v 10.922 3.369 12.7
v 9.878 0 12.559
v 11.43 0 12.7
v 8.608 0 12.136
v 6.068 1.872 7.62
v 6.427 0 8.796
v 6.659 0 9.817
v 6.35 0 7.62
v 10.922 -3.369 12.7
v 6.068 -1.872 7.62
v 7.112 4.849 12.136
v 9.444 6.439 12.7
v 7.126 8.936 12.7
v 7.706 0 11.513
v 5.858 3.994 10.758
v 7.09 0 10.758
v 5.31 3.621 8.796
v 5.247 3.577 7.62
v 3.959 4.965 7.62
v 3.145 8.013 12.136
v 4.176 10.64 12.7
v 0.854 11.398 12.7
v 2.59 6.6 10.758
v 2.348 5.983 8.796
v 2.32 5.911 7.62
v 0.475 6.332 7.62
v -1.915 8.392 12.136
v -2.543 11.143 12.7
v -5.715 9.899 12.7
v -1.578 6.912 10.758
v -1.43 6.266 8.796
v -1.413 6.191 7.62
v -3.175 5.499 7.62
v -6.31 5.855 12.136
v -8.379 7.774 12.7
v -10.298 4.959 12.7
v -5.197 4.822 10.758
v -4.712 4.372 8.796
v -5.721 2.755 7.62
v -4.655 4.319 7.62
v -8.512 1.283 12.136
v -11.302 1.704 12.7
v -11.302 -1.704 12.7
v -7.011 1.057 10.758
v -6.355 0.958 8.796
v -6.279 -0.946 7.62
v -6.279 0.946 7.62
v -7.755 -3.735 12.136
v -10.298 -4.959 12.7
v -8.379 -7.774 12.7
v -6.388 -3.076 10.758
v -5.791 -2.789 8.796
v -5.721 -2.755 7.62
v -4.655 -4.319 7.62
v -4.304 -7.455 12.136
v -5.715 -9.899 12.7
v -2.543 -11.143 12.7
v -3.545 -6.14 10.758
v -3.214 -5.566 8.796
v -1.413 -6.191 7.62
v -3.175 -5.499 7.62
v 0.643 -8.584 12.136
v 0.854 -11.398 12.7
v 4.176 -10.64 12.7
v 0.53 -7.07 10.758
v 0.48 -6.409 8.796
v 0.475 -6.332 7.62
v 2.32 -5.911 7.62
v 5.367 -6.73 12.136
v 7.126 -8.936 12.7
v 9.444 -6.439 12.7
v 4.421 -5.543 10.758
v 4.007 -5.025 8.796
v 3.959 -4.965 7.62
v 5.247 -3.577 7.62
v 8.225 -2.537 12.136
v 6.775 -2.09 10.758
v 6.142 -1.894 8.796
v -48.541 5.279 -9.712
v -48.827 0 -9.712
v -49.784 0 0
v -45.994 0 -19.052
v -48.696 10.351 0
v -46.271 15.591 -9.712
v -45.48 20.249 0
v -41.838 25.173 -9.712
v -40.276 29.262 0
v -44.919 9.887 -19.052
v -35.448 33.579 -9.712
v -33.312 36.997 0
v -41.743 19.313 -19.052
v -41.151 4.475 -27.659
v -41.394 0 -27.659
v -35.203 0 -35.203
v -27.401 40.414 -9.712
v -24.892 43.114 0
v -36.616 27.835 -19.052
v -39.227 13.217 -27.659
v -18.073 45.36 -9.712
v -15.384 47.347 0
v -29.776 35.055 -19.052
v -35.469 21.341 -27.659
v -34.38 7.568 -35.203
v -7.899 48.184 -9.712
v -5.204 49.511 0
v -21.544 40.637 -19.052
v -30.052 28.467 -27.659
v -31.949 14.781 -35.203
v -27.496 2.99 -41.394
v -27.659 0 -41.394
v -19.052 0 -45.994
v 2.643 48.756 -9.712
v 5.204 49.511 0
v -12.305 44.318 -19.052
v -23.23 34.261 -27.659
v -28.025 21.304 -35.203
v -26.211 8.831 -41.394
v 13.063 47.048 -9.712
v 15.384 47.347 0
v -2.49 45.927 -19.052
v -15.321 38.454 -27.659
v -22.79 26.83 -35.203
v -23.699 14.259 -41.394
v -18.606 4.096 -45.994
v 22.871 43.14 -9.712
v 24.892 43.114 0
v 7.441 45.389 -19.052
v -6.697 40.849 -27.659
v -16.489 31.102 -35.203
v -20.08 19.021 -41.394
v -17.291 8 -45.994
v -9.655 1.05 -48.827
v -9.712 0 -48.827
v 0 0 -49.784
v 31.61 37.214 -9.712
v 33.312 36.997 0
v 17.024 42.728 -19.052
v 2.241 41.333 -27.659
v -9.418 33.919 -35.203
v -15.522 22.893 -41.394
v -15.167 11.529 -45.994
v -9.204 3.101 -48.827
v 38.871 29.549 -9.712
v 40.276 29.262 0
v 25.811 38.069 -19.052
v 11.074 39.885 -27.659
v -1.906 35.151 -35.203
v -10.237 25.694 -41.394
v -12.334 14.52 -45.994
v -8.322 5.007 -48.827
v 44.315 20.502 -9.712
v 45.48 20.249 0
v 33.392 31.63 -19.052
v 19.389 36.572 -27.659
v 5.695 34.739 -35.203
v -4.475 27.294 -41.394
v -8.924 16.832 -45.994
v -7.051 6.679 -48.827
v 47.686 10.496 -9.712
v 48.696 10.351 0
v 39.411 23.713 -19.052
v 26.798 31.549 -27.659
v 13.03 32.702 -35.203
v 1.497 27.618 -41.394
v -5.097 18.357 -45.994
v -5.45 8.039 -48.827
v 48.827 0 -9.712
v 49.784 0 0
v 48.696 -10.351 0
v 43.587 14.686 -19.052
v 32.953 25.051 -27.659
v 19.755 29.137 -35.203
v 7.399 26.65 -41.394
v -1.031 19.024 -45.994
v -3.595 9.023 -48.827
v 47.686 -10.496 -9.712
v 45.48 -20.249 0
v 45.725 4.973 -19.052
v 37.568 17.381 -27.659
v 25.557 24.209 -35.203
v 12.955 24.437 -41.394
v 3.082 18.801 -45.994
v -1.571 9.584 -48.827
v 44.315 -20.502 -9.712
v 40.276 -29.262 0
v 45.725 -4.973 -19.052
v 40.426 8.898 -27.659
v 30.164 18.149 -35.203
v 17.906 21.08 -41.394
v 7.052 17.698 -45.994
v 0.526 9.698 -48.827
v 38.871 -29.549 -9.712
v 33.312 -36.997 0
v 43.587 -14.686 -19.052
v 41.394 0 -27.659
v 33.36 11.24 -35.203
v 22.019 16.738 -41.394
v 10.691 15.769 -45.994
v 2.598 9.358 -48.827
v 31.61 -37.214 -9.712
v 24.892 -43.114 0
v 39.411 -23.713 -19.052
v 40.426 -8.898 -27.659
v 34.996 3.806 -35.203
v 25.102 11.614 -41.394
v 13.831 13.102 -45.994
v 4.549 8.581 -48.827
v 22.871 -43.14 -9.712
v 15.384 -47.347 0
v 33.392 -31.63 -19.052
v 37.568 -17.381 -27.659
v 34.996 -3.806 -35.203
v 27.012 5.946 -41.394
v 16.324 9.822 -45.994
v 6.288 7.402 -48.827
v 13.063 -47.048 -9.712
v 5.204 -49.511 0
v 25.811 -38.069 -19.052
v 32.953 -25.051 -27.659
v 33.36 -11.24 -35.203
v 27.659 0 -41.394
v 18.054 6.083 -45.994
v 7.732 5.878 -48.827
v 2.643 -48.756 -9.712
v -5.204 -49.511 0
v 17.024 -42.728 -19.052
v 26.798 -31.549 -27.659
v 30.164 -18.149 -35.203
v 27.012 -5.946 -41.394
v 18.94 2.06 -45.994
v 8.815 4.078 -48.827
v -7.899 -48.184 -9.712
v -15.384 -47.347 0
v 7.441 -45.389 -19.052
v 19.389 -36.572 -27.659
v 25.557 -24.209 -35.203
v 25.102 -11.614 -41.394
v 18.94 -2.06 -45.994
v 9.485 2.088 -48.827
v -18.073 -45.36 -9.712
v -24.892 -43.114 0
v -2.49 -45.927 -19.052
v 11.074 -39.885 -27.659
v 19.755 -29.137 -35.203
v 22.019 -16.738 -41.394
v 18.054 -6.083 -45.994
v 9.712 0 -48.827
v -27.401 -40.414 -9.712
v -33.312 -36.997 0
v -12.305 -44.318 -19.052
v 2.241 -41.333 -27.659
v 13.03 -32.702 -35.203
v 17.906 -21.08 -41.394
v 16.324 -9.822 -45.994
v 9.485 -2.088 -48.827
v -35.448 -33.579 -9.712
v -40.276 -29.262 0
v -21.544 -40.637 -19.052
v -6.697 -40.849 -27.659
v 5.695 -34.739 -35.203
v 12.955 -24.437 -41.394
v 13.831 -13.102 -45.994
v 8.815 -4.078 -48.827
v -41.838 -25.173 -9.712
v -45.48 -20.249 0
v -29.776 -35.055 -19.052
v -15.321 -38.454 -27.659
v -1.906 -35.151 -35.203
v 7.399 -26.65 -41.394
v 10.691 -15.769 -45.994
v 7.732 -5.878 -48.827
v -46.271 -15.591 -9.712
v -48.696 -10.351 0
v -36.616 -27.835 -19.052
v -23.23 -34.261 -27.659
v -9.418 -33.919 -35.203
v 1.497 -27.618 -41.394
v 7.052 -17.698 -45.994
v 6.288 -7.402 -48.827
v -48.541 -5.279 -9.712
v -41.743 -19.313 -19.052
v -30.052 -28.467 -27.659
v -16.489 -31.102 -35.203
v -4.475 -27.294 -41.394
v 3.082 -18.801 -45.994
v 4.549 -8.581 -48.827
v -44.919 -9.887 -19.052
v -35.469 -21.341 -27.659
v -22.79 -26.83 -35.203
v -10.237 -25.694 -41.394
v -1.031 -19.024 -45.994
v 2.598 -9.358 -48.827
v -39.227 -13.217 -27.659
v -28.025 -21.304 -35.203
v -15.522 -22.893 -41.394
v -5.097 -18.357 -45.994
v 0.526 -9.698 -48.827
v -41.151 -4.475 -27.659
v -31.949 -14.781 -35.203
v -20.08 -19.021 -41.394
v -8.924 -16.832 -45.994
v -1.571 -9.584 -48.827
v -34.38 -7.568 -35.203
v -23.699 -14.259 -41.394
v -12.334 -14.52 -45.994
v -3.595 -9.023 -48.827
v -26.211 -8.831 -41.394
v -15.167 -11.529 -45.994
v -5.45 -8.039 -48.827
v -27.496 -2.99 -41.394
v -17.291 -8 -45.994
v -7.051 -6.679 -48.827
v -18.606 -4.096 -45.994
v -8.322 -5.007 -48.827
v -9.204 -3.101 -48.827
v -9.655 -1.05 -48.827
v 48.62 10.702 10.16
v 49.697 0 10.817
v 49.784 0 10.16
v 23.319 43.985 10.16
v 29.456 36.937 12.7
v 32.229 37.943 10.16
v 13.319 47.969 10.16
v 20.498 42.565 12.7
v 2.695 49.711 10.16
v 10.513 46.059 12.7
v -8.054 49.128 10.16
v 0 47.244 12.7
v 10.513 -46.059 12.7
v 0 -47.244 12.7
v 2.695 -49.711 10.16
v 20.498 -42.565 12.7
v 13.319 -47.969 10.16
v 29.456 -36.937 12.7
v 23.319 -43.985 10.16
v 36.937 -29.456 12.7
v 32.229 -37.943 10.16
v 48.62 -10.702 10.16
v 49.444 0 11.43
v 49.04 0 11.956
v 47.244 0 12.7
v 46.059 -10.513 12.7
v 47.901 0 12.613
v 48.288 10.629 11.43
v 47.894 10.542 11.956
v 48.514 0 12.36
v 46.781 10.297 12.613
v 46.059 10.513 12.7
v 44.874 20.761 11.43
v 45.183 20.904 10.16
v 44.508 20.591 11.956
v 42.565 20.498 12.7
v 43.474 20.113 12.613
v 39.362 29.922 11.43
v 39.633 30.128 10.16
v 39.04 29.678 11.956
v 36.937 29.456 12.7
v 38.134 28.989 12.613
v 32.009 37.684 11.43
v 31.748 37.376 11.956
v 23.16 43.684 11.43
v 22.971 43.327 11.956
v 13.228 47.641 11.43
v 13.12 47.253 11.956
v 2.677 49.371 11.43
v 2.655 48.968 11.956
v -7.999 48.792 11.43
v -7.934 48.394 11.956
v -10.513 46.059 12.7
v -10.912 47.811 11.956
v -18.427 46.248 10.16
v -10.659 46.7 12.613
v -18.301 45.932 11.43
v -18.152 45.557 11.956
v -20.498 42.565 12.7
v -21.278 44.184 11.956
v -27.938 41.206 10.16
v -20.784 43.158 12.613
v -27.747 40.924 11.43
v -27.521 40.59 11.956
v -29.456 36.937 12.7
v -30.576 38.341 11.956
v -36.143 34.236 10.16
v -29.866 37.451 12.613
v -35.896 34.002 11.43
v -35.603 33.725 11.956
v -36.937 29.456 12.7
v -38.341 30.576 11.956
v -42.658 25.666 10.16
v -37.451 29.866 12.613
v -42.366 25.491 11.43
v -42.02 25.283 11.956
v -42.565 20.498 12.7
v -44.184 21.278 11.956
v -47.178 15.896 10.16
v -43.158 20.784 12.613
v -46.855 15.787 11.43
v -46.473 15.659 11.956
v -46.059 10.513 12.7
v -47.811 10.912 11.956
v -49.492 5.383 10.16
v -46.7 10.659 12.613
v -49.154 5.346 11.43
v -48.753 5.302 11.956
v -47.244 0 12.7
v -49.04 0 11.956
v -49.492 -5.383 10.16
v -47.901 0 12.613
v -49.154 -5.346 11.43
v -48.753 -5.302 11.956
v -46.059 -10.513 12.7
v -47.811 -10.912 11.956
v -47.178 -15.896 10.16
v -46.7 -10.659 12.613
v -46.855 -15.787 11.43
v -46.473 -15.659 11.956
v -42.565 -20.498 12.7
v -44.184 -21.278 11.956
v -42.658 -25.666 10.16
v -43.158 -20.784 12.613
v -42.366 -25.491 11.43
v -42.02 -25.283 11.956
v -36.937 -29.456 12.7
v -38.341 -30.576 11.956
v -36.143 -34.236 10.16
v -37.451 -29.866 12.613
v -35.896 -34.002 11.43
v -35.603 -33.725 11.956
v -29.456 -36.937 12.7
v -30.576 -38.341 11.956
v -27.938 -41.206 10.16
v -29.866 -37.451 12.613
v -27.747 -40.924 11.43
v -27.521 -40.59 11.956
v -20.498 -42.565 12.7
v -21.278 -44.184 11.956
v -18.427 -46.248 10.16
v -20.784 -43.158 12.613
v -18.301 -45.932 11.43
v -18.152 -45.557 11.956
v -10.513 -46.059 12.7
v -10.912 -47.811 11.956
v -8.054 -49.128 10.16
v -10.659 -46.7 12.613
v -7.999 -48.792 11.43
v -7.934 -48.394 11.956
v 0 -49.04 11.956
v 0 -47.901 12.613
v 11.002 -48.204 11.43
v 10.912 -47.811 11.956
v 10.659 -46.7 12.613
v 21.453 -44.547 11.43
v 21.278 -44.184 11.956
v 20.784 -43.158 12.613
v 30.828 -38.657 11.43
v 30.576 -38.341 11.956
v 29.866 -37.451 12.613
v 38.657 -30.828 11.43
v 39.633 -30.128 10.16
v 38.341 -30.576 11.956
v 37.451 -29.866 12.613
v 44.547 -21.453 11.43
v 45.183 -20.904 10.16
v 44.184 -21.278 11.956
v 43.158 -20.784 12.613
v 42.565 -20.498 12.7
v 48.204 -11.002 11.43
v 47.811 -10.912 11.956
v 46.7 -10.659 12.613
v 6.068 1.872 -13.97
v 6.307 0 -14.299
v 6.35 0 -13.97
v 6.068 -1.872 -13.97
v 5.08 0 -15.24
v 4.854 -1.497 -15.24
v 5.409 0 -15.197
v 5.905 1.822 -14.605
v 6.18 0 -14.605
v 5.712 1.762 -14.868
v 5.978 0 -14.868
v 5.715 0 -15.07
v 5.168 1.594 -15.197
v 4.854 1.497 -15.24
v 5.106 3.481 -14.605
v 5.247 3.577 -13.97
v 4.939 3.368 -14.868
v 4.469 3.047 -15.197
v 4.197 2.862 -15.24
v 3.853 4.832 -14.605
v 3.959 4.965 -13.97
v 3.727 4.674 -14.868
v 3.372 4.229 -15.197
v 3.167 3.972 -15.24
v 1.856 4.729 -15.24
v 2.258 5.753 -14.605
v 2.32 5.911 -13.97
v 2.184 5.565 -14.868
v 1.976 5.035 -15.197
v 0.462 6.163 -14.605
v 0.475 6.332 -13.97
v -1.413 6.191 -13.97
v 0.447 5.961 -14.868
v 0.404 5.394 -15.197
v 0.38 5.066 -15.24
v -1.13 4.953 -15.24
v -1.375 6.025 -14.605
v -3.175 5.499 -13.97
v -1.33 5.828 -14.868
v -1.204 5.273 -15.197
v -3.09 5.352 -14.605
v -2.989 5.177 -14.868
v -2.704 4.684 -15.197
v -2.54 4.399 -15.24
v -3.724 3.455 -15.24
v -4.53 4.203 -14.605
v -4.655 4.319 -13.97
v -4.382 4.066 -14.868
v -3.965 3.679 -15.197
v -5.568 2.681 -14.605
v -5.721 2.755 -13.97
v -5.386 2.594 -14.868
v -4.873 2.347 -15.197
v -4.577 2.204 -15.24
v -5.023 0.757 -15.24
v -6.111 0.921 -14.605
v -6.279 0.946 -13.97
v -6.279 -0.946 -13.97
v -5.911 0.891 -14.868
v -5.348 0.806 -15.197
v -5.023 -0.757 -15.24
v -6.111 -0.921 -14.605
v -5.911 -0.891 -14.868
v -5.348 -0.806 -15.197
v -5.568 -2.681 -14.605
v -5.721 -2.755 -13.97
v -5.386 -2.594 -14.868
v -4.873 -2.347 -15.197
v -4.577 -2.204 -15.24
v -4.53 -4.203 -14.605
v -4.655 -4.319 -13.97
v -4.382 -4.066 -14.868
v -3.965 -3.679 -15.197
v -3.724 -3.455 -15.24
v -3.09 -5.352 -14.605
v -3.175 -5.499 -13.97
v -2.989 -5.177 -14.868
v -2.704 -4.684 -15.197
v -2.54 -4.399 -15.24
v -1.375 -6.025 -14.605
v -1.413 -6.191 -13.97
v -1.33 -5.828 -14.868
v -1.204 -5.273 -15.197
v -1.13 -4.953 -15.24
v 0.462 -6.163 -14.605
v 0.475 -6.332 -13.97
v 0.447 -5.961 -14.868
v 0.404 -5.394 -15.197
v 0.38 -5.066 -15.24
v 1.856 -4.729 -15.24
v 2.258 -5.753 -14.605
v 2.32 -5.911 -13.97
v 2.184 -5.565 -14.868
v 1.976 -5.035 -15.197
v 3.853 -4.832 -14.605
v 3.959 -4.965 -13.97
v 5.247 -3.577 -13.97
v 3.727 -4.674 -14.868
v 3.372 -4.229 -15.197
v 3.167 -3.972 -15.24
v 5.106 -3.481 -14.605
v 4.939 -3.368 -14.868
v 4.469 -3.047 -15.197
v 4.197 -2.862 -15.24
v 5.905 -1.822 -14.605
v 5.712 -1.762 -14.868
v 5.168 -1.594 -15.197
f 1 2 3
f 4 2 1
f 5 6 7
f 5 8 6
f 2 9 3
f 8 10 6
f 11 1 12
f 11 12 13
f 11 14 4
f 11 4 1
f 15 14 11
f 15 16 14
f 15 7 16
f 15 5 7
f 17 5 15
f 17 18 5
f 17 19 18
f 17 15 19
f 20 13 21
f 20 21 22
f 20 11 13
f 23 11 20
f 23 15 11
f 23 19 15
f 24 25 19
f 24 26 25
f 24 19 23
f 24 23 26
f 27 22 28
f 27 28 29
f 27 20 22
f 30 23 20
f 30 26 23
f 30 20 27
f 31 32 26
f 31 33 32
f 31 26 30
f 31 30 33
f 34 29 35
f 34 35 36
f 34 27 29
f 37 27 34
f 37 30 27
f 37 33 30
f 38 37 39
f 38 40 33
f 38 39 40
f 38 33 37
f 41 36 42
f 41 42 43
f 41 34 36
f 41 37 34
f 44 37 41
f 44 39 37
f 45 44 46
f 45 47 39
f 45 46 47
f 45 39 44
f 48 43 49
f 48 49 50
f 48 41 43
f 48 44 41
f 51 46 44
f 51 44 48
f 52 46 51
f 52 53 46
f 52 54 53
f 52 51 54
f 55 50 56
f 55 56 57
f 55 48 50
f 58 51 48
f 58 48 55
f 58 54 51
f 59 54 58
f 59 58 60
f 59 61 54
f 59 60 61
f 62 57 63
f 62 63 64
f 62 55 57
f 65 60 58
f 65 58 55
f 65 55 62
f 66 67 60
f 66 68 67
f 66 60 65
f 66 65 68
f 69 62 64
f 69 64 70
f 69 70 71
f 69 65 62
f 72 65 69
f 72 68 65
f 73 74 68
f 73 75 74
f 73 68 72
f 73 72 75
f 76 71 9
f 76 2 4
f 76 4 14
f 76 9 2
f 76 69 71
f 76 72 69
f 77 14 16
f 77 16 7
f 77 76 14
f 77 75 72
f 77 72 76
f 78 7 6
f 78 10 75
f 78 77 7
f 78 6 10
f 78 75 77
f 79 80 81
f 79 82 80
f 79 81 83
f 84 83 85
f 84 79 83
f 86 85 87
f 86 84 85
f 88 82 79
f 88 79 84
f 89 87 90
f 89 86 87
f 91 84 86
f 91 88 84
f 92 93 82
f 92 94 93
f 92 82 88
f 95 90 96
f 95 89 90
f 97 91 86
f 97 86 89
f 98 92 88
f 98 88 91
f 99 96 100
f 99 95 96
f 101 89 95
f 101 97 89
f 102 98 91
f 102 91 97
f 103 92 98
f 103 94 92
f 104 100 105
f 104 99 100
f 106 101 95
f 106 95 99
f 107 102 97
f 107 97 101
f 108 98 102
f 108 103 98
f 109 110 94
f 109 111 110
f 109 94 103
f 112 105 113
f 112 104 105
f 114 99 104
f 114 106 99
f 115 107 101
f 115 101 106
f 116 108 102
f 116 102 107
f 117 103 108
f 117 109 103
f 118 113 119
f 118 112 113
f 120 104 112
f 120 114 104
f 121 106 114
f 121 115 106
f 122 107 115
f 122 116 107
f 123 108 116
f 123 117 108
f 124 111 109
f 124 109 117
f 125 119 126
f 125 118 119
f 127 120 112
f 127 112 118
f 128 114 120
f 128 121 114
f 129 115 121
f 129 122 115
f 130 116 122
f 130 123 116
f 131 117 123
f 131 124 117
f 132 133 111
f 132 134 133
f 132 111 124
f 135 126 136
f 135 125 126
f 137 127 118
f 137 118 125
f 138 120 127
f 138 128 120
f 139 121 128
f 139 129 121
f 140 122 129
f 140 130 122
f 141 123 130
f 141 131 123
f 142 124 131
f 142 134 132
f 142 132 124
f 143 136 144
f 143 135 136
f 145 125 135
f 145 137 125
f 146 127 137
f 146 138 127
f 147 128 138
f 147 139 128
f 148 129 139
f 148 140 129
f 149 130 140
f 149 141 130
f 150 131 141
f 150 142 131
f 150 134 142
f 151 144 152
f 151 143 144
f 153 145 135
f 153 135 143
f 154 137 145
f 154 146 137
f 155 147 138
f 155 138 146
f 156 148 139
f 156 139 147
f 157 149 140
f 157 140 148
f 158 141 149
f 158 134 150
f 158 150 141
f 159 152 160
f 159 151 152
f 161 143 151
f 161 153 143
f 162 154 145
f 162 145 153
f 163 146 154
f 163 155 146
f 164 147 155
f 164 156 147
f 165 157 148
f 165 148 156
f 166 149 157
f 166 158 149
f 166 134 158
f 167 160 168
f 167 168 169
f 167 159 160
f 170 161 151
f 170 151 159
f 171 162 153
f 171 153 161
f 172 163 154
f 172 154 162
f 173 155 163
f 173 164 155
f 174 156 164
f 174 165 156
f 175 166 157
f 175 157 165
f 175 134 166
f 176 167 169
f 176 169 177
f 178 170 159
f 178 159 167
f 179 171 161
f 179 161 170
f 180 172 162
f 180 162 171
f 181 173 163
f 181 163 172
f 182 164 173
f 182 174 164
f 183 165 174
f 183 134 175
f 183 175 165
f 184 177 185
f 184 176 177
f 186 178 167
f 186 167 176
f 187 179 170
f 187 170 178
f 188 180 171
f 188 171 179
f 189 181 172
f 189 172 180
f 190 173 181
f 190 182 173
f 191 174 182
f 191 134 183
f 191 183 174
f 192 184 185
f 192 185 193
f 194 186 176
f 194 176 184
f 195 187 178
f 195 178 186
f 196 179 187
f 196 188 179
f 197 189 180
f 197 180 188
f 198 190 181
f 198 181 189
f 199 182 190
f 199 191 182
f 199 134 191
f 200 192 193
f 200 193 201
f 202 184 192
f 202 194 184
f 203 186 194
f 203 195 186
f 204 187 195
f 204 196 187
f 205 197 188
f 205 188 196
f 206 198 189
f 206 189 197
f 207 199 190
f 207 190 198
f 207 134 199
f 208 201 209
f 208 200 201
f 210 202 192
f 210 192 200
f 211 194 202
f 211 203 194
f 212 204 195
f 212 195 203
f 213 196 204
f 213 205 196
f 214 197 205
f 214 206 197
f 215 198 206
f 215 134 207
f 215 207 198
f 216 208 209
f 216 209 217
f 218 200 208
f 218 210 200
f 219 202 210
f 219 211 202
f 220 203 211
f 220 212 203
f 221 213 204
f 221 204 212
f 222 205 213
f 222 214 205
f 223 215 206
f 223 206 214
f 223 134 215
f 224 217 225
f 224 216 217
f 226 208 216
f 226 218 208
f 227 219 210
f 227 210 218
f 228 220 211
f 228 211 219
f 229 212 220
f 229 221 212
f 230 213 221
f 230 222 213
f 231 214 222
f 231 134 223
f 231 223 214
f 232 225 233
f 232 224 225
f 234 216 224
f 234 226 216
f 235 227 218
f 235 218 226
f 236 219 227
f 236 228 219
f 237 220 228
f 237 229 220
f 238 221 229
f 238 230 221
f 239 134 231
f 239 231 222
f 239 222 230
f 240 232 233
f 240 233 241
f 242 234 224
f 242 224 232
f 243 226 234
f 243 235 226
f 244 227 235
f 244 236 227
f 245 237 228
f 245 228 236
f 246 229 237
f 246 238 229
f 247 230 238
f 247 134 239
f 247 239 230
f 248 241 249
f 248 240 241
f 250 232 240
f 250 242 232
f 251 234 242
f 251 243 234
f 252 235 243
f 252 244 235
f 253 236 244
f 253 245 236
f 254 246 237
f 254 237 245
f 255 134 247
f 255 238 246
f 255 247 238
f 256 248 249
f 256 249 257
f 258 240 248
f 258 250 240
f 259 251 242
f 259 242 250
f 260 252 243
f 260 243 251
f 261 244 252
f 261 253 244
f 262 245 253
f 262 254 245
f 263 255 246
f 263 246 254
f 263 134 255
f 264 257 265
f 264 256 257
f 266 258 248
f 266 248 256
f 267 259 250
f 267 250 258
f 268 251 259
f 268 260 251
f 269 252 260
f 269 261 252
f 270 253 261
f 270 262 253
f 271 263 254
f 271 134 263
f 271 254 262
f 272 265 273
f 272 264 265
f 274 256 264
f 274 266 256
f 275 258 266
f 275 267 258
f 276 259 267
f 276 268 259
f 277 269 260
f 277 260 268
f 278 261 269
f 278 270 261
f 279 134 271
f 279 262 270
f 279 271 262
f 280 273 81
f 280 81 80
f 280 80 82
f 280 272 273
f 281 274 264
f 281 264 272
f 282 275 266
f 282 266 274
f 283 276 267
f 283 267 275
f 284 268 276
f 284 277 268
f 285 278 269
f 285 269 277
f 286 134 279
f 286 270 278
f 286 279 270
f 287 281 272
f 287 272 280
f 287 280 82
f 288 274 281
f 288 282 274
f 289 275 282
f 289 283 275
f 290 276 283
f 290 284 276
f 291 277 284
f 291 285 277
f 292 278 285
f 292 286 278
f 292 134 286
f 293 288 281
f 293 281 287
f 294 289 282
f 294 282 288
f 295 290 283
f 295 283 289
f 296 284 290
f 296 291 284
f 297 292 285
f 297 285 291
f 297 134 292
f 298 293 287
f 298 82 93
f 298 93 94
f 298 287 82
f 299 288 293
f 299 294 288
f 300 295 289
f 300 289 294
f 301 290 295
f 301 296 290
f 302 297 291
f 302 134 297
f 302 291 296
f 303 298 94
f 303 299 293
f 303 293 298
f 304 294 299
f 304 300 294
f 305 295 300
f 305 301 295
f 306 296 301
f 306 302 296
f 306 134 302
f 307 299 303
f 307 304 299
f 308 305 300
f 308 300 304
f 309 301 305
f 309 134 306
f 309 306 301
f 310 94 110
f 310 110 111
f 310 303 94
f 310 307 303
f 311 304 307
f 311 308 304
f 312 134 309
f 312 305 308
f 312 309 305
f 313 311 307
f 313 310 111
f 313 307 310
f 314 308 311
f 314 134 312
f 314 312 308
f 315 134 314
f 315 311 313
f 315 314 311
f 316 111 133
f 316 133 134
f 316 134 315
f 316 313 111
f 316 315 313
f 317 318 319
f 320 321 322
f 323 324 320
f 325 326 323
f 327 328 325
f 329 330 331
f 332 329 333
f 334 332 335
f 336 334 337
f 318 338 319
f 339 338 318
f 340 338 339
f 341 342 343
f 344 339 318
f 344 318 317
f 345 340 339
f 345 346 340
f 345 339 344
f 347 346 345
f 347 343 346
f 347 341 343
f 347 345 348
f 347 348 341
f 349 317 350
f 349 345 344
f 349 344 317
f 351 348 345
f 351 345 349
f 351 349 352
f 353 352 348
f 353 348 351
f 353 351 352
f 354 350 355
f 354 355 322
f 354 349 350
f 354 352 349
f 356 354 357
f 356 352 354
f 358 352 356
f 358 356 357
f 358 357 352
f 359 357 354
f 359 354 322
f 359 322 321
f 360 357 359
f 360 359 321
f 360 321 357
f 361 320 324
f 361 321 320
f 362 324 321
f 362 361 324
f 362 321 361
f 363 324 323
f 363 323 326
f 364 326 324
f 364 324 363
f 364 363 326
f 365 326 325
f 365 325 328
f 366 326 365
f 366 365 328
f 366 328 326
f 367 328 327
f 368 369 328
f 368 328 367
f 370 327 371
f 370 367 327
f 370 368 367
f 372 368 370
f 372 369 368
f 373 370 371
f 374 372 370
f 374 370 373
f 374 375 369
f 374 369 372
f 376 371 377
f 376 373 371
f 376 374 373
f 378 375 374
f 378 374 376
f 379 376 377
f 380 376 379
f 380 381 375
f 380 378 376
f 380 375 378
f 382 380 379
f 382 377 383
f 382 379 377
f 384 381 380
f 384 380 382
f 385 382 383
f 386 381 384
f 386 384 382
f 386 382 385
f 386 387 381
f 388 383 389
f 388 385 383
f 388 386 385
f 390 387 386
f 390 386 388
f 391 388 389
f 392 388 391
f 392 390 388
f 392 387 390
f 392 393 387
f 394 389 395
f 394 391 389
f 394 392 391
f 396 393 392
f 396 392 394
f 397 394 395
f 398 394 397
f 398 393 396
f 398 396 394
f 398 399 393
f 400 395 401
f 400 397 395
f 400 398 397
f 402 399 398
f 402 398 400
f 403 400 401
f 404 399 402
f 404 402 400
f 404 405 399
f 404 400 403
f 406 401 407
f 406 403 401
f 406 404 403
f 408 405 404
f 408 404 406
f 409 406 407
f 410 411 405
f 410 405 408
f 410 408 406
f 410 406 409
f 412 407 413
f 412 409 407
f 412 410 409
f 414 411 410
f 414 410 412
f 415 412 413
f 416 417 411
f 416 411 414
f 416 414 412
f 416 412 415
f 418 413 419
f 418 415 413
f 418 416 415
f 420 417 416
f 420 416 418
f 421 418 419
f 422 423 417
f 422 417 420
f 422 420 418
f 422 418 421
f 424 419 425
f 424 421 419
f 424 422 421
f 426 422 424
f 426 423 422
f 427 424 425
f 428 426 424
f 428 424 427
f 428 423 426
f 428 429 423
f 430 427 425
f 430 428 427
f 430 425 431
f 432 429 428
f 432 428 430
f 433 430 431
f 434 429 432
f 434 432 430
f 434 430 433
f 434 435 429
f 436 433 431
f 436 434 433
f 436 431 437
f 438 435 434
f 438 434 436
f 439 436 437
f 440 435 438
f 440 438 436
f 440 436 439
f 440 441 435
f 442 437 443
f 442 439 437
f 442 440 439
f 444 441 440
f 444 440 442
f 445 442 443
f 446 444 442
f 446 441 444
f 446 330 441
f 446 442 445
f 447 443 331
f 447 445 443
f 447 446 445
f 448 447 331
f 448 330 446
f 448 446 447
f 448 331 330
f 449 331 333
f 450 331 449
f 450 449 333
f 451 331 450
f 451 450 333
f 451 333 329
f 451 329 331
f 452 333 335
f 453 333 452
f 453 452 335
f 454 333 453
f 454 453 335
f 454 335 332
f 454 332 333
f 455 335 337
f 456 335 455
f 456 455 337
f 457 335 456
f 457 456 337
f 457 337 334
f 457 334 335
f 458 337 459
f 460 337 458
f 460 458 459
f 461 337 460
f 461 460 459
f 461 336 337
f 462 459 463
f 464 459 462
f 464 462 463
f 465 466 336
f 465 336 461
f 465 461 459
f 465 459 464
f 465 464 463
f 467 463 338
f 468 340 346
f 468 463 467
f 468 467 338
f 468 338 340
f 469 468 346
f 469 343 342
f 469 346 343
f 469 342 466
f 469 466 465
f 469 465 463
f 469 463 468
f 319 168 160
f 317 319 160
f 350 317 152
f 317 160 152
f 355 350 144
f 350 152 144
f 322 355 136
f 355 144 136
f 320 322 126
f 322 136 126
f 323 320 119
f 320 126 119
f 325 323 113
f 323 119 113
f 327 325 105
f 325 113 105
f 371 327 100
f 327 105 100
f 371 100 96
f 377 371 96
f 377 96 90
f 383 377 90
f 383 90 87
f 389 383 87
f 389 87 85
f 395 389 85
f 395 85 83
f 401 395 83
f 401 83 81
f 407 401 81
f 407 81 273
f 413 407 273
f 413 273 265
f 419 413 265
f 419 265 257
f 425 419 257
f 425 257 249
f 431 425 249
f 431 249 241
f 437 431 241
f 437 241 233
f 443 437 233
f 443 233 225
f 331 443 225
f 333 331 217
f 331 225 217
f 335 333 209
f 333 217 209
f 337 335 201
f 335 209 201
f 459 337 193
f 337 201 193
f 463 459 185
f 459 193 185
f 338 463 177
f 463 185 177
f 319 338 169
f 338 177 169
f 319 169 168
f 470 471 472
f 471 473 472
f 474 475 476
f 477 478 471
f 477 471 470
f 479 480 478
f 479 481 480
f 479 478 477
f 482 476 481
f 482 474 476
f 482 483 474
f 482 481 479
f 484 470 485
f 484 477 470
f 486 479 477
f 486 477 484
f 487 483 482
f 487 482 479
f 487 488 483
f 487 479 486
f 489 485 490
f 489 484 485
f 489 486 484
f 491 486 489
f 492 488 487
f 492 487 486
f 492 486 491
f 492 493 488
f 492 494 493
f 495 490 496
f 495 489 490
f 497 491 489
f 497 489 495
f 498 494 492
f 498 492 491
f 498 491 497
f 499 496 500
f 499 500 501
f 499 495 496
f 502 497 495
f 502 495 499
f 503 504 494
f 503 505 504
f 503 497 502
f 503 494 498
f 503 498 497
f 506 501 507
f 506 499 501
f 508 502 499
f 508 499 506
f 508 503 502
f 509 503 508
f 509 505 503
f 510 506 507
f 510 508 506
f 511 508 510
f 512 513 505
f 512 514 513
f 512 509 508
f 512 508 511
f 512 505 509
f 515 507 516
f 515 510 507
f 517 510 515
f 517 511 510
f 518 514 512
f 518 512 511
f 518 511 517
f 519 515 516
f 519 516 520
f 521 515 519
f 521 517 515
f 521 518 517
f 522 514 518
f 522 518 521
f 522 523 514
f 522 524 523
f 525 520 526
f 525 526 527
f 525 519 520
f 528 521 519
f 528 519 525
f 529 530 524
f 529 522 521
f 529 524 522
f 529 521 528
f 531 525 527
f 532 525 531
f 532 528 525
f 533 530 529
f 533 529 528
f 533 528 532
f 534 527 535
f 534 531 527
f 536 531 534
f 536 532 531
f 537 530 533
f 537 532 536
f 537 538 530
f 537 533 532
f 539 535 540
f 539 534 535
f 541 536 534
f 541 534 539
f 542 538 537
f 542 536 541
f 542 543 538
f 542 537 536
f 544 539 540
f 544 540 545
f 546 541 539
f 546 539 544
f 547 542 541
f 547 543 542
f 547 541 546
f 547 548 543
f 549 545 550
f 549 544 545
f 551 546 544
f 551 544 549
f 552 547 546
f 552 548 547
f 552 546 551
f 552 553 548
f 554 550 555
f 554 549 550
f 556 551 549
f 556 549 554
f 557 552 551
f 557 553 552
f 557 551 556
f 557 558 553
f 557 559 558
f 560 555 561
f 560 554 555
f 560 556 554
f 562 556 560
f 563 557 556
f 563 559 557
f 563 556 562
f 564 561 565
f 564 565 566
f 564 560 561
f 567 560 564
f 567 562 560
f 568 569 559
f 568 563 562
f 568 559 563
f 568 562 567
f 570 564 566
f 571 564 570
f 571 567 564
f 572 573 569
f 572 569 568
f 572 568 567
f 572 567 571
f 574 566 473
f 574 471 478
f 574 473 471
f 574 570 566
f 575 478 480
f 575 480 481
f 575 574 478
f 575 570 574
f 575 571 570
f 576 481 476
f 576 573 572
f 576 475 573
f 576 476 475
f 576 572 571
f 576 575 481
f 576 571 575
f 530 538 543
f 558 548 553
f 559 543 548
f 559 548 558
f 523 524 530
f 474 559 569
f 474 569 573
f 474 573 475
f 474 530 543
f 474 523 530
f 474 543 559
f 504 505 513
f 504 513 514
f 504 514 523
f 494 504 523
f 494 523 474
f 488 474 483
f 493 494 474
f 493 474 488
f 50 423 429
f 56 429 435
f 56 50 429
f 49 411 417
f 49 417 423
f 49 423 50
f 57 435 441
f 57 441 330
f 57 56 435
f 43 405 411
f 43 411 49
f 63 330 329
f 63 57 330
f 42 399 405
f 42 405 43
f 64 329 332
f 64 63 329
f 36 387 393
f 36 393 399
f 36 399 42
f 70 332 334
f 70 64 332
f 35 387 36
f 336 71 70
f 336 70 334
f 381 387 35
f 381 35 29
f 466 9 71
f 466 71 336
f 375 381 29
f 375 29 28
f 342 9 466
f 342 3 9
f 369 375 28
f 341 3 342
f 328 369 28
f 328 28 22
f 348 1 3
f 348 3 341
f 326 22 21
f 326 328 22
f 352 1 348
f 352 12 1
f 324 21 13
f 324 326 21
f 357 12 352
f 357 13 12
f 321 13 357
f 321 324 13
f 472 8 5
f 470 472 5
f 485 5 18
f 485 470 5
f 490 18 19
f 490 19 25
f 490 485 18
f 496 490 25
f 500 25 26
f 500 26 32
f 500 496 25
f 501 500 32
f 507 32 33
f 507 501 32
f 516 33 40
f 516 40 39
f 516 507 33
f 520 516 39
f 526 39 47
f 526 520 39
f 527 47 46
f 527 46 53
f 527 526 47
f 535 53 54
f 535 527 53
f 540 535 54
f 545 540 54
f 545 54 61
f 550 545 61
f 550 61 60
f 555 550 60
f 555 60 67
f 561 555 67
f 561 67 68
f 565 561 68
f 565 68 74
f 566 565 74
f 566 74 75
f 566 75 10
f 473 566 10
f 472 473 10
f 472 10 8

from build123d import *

# Parameters (mm, degrees)
F2_R     = 49.784
F2_R_2   = 6.35
F3_DEPTH = 12.7
F4_R     = 2.54
F6_DEPTH = 15.24
F7_R     = 1.27


# Not quite as in the source:
# - a fillet or chamfer that OpenCascade refuses, or shapes differently, is made with other operations: its cross-section is extruded or revolved along the edge and cut away or added


with BuildPart() as f1:
    # F0 (on Front) → F1 (revolve)
    with BuildSketch(Plane.XZ):
        with BuildLine():
            Line((0, 0), (-49.784, 0))
            ThreePointArc((-49.784, 0), (-35.2026039946, -35.2026039946), (0, -49.784))
            Line((0, -49.784), (0, 0))
        make_face()
    revolve(axis=Axis((0, 0, -24.892), (0, 0, -1)))

    # F2 (on face) → F3 (join)
    with BuildSketch(Plane.XY):
        Circle(F2_R)
        Circle(F2_R_2, mode=Mode.SUBTRACT)
    extrude(amount=F3_DEPTH)

    # F4
    f4_edges = [f1.edges().sort_by_distance(p)[0] for p in [
        (-49.784, 0, 12.7),
    ]]
    fillet(f4_edges, radius=F4_R)

    # F5: fillet of radius 5.08 on 1 edges, made by hand

    # F5_s1 → F5_t2 (revolve, cut)
    with BuildSketch(Plane.XZ):
        with BuildLine():
            add(Edge.make_bspline(
                [(11.43, 12.7), (6.35, 12.7), (6.35, 7.62)],
                knots=[0, 0, 0, 1, 1, 1], degree=2, weights=[1, 1, 1]))
            Line((6.35, 7.62), (6.35, 12.7))
            Line((6.35, 12.7), (11.43, 12.7))
        make_face()
    revolve(axis=Axis((0, 0, 12.7), (0, 0, 1)), mode=Mode.SUBTRACT)

    # F6 (cut): a face of the model
    f6_faces = [f1.faces().sort_by_distance(p)[0] for p in [
        (0, 0, 0),
    ]]
    extrude(f6_faces, amount=-F6_DEPTH, mode=Mode.SUBTRACT)

    # F7
    f7_edges = [f1.edges().sort_by_distance(p)[0] for p in [
        (-6.35, 0, -15.24),
    ]]
    fillet(f7_edges, radius=F7_R)


solid = f1.part
